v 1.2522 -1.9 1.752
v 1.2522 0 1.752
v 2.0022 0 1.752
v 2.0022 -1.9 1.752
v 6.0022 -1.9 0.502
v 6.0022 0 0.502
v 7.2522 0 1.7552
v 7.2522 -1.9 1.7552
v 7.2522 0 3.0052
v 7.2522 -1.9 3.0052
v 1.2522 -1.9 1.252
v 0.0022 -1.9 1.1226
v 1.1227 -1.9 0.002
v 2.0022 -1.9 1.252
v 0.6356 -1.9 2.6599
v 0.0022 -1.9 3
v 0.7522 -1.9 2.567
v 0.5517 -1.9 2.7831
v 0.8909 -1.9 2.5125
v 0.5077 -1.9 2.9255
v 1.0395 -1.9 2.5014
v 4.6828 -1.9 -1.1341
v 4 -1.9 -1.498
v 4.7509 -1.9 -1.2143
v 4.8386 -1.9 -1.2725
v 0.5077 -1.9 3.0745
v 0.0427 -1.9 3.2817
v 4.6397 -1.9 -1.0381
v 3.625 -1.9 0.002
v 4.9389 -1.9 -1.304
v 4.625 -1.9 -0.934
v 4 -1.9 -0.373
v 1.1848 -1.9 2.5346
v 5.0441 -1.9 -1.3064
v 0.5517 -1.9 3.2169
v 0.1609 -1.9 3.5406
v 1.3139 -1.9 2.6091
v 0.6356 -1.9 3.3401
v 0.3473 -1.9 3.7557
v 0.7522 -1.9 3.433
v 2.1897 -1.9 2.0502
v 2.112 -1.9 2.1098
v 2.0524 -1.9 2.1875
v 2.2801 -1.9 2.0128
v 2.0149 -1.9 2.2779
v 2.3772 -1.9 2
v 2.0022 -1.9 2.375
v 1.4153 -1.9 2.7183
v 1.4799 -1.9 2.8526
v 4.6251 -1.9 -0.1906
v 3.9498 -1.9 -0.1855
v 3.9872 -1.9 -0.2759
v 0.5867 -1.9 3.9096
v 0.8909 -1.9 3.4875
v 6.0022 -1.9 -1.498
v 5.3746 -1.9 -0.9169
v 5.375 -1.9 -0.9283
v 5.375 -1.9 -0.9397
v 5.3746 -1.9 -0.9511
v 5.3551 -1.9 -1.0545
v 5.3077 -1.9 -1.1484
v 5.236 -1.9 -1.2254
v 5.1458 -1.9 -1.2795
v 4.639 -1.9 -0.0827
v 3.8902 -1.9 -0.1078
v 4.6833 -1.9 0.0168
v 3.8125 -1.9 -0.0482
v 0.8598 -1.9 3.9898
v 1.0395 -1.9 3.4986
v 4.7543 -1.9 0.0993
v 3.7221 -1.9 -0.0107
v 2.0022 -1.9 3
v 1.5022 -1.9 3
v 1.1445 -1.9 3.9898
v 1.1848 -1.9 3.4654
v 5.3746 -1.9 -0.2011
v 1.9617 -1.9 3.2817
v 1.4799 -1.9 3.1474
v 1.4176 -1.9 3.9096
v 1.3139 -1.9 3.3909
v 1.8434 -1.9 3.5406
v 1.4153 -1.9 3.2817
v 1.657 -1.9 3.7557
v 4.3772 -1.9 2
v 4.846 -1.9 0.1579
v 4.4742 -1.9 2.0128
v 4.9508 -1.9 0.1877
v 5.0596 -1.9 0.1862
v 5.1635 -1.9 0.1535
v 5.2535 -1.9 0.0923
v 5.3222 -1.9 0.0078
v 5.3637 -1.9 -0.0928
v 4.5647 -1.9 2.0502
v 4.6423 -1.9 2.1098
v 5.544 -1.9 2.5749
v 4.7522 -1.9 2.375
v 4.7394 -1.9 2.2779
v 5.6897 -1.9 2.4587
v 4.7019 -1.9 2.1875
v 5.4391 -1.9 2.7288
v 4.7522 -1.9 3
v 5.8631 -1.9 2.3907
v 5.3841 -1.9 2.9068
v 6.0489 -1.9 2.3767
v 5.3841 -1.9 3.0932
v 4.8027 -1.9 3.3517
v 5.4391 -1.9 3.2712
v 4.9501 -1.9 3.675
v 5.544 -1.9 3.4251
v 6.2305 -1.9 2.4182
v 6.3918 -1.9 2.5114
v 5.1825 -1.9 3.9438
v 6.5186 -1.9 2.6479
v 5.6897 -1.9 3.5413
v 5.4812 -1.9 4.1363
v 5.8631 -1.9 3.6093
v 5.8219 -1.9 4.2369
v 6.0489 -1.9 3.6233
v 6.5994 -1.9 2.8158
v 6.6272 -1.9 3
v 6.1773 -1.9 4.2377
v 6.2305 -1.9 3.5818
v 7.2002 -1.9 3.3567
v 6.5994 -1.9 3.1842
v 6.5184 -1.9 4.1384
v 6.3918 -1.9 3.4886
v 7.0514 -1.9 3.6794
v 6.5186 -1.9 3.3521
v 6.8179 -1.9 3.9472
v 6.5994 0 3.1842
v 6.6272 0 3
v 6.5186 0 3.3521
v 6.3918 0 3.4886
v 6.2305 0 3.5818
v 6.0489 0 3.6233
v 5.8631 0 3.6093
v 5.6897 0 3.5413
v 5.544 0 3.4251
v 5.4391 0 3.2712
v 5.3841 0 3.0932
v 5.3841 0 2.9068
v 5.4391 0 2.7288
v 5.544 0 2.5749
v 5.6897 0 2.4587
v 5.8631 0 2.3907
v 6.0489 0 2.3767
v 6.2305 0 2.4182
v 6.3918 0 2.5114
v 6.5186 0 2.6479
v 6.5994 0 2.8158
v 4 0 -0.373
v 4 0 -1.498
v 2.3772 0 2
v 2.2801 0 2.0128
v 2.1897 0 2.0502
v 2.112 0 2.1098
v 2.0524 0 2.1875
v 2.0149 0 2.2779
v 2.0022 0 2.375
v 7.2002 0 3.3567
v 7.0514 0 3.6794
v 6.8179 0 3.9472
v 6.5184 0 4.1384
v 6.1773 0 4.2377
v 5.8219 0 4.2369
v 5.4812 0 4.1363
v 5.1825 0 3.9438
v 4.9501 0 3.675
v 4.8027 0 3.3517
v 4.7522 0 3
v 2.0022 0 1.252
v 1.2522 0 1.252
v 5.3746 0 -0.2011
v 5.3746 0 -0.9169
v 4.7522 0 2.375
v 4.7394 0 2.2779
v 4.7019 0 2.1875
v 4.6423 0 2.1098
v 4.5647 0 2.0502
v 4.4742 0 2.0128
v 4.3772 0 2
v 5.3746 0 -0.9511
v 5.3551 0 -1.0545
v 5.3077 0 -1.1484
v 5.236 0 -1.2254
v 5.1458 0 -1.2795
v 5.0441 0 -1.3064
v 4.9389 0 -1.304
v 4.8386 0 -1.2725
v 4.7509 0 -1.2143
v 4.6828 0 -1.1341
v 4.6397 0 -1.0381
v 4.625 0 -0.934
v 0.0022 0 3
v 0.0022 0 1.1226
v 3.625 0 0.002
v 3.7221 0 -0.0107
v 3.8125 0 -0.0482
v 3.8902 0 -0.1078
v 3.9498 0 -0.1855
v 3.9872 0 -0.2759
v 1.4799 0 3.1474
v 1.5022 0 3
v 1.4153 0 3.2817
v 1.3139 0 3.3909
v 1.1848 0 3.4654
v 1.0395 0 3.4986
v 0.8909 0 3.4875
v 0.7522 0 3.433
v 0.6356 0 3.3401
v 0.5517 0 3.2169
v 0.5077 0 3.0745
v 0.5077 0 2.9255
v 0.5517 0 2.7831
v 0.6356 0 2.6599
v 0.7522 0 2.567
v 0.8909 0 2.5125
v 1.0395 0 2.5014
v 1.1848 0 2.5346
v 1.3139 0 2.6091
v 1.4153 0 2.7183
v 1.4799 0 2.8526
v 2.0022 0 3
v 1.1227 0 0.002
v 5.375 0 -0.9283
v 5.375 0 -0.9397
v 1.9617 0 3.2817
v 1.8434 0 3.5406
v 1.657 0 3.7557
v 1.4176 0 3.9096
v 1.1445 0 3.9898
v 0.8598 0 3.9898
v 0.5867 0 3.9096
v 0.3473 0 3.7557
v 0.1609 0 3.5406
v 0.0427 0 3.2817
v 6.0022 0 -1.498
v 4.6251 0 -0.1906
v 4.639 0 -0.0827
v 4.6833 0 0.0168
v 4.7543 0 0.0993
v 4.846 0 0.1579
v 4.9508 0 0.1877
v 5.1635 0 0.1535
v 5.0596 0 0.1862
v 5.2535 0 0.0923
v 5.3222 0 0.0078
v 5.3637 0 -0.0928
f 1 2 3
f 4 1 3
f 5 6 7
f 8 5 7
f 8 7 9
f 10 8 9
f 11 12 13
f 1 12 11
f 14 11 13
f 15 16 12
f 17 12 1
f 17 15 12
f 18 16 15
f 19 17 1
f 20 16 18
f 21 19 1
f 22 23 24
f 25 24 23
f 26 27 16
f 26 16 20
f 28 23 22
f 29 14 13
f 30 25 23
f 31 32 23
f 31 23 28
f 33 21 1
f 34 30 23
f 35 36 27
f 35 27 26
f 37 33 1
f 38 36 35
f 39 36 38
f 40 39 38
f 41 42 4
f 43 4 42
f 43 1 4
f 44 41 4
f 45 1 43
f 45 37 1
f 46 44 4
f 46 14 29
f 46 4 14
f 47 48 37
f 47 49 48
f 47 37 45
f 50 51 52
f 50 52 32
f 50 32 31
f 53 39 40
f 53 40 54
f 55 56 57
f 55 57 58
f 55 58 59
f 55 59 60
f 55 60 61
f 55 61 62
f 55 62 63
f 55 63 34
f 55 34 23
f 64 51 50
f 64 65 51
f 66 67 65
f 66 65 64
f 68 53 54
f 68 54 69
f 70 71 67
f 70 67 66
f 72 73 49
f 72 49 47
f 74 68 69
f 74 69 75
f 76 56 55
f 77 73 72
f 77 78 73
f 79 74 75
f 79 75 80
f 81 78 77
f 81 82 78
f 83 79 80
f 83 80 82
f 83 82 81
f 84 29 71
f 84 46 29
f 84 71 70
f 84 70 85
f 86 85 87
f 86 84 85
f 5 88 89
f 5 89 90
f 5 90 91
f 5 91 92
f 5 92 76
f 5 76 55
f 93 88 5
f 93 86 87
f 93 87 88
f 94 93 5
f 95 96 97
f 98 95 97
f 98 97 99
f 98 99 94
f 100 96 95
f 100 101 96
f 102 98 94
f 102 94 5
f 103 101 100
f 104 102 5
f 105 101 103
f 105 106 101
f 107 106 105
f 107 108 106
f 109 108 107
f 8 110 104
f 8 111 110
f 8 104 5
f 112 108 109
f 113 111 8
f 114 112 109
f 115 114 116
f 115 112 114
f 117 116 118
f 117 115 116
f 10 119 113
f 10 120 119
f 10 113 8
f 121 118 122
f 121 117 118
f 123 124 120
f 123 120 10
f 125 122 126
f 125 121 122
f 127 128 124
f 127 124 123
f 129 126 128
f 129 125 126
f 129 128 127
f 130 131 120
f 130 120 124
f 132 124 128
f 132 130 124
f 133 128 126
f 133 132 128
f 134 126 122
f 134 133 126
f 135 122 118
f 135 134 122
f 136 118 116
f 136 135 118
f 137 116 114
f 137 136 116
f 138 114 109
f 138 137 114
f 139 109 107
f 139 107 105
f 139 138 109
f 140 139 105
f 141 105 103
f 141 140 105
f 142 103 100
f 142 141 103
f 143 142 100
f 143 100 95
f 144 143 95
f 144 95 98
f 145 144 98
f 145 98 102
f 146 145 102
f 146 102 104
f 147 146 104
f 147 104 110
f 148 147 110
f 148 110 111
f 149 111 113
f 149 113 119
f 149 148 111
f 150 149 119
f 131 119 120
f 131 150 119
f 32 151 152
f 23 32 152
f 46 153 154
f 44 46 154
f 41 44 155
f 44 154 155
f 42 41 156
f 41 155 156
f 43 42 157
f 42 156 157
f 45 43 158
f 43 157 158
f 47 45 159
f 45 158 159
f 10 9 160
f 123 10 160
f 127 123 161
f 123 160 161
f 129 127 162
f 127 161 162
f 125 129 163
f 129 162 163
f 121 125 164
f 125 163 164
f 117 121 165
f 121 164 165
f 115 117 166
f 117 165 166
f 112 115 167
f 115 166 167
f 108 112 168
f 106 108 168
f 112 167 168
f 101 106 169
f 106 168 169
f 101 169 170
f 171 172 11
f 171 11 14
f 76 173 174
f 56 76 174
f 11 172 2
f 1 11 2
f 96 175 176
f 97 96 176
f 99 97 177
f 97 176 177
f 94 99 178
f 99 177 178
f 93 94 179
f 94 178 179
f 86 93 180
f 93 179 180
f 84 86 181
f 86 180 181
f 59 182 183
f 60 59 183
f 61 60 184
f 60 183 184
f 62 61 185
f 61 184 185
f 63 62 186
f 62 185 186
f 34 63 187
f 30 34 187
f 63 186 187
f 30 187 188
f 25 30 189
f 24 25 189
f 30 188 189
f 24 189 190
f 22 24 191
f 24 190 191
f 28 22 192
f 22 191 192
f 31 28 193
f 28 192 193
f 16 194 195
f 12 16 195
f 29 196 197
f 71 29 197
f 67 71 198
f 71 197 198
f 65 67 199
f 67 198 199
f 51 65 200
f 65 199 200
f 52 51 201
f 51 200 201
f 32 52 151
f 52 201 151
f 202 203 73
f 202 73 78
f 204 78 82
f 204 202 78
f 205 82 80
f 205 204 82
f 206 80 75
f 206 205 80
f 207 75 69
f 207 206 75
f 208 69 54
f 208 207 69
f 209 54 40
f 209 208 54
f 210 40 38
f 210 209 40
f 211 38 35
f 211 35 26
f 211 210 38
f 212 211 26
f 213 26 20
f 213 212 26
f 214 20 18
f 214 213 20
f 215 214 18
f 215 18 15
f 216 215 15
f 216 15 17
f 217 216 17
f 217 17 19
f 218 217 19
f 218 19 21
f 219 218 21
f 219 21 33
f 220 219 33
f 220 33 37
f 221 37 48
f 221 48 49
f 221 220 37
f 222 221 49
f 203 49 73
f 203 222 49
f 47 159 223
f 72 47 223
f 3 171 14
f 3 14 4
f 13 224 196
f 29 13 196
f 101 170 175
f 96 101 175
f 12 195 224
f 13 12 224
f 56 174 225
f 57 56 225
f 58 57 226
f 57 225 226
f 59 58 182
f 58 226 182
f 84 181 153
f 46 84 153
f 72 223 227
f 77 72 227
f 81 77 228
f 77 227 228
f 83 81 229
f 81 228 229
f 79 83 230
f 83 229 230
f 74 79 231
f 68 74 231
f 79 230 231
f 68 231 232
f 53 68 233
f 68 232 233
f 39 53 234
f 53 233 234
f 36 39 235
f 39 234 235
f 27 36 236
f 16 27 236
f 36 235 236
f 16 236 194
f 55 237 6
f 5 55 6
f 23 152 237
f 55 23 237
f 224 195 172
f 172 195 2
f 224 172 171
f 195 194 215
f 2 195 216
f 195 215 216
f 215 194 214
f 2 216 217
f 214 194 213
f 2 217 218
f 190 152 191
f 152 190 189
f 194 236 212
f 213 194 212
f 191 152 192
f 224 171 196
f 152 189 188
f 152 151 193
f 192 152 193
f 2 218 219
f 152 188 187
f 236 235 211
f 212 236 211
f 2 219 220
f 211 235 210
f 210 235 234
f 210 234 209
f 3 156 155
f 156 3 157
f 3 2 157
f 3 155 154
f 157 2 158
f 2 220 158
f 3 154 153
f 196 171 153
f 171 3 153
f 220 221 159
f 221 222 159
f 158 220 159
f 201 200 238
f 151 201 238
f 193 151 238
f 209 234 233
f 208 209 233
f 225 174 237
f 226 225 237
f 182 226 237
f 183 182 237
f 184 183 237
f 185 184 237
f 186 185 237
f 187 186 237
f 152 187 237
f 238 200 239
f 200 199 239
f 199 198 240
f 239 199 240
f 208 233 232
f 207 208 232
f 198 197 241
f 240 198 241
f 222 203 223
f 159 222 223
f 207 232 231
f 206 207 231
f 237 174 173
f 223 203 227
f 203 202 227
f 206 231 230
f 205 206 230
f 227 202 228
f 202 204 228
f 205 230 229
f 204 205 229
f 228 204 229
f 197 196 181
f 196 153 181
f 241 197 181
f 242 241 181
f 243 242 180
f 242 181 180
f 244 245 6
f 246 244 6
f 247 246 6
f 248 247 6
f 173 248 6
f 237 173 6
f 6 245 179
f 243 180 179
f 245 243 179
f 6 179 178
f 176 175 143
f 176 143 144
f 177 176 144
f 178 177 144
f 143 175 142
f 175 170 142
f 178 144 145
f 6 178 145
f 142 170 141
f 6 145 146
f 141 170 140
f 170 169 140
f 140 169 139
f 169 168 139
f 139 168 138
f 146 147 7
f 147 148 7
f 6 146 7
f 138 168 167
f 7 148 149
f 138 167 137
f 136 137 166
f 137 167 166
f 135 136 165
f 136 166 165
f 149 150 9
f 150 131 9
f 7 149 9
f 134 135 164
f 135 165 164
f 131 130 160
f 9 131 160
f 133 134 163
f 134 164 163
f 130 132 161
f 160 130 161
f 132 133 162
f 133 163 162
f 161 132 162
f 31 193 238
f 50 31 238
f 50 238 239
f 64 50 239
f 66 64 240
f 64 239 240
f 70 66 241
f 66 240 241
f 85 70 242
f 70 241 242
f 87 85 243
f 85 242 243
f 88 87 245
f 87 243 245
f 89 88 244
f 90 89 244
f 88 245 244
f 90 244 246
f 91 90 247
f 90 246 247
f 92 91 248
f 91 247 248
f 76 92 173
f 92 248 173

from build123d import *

# Parameters (mm, degrees)
F0_W     = 0.75
F0_H     = 0.5
F0_R     = 0.5
F0_R_2   = 0.625
F1_DEPTH = 1.9


# Not quite as in the source:
# - ends of sketch curves that miss each other by under 0.0002 mm in the source are joined


with BuildPart() as f1:
    # F0 (on Front) → F1 (new body)
    with BuildSketch(Plane.XZ):
        with BuildLine():
            Line((0.0021614751, 1.1225641938), (1.122697085, 0.0020285839))
            Line((1.122697085, 0.0020285839), (3.625, 0.0020285839))
            ThreePointArc((3.625, 0.0020285839), (3.8901650429, -0.1078063731), (4, -0.3729714161))
            Line((4, -0.3729714161), (4, -1.4979714161))
            Line((4, -1.4979714161), (6.0021614751, -1.4979714161))
            Line((6.0021614751, -1.4979714161), (6.0021614751, 0.5020285839))
            Line((6.0021614751, 0.5020285839), (7.2521614751, 1.7551845998))
            Line((7.2521614751, 1.7551845998), (7.2521614751, 3))
            Line((7.2521614751, 3), (7.2521614751, 3.0051845998))
            ThreePointArc((7.2521614751, 3.0051845998), (5.9995691919, 4.249997312), (4.7521614751, 3))
            Line((4.7521614751, 3), (4.7521614751, 2.375))
            ThreePointArc((4.7521614751, 2.375), (4.642326518, 2.1098349571), (4.3771614751, 2))
            Line((4.3771614751, 2), (2.3771614751, 2))
            ThreePointArc((2.3771614751, 2), (2.1119964322, 2.1098349571), (2.0021614751, 2.375))
            Line((2.0021614751, 2.375), (2.0021614751, 3))
            ThreePointArc((2.0021614751, 3), (1.0021614751, 4), (0.0021614751, 3))
            Line((0.0021614751, 3), (0.0021614751, 1.1225641938))
        make_face()
        with BuildLine():
            ThreePointArc((5.3746090938, -0.9511214132), (4.9914239554, -1.3089053091), (4.6250000012, -0.9339737791))
            Line((4.6250000012, -0.9339737791), (4.6250586901, -0.1906377023))
            ThreePointArc((4.6250586901, -0.1906377023), (5.0052444867, 0.1909599387), (5.3746090938, -0.2011214132))
            Line((5.3746090938, -0.2011214132), (5.3746090938, -0.9168853601))
            ThreePointArc((5.3746090938, -0.9168853601), (5.375, -0.9340033866), (5.3746090938, -0.9511214132))
        make_face(mode=Mode.SUBTRACT)
        with Locations((1.6271614751, 1.5020285839)):
            Rectangle(F0_W, F0_H, mode=Mode.SUBTRACT)
        with Locations((1.0021614751, 3)):
            Circle(F0_R, mode=Mode.SUBTRACT)
        with Locations((6.0021614751, 3)):
            Circle(F0_R_2, mode=Mode.SUBTRACT)
    extrude(amount=F1_DEPTH)


solid = f1.part
